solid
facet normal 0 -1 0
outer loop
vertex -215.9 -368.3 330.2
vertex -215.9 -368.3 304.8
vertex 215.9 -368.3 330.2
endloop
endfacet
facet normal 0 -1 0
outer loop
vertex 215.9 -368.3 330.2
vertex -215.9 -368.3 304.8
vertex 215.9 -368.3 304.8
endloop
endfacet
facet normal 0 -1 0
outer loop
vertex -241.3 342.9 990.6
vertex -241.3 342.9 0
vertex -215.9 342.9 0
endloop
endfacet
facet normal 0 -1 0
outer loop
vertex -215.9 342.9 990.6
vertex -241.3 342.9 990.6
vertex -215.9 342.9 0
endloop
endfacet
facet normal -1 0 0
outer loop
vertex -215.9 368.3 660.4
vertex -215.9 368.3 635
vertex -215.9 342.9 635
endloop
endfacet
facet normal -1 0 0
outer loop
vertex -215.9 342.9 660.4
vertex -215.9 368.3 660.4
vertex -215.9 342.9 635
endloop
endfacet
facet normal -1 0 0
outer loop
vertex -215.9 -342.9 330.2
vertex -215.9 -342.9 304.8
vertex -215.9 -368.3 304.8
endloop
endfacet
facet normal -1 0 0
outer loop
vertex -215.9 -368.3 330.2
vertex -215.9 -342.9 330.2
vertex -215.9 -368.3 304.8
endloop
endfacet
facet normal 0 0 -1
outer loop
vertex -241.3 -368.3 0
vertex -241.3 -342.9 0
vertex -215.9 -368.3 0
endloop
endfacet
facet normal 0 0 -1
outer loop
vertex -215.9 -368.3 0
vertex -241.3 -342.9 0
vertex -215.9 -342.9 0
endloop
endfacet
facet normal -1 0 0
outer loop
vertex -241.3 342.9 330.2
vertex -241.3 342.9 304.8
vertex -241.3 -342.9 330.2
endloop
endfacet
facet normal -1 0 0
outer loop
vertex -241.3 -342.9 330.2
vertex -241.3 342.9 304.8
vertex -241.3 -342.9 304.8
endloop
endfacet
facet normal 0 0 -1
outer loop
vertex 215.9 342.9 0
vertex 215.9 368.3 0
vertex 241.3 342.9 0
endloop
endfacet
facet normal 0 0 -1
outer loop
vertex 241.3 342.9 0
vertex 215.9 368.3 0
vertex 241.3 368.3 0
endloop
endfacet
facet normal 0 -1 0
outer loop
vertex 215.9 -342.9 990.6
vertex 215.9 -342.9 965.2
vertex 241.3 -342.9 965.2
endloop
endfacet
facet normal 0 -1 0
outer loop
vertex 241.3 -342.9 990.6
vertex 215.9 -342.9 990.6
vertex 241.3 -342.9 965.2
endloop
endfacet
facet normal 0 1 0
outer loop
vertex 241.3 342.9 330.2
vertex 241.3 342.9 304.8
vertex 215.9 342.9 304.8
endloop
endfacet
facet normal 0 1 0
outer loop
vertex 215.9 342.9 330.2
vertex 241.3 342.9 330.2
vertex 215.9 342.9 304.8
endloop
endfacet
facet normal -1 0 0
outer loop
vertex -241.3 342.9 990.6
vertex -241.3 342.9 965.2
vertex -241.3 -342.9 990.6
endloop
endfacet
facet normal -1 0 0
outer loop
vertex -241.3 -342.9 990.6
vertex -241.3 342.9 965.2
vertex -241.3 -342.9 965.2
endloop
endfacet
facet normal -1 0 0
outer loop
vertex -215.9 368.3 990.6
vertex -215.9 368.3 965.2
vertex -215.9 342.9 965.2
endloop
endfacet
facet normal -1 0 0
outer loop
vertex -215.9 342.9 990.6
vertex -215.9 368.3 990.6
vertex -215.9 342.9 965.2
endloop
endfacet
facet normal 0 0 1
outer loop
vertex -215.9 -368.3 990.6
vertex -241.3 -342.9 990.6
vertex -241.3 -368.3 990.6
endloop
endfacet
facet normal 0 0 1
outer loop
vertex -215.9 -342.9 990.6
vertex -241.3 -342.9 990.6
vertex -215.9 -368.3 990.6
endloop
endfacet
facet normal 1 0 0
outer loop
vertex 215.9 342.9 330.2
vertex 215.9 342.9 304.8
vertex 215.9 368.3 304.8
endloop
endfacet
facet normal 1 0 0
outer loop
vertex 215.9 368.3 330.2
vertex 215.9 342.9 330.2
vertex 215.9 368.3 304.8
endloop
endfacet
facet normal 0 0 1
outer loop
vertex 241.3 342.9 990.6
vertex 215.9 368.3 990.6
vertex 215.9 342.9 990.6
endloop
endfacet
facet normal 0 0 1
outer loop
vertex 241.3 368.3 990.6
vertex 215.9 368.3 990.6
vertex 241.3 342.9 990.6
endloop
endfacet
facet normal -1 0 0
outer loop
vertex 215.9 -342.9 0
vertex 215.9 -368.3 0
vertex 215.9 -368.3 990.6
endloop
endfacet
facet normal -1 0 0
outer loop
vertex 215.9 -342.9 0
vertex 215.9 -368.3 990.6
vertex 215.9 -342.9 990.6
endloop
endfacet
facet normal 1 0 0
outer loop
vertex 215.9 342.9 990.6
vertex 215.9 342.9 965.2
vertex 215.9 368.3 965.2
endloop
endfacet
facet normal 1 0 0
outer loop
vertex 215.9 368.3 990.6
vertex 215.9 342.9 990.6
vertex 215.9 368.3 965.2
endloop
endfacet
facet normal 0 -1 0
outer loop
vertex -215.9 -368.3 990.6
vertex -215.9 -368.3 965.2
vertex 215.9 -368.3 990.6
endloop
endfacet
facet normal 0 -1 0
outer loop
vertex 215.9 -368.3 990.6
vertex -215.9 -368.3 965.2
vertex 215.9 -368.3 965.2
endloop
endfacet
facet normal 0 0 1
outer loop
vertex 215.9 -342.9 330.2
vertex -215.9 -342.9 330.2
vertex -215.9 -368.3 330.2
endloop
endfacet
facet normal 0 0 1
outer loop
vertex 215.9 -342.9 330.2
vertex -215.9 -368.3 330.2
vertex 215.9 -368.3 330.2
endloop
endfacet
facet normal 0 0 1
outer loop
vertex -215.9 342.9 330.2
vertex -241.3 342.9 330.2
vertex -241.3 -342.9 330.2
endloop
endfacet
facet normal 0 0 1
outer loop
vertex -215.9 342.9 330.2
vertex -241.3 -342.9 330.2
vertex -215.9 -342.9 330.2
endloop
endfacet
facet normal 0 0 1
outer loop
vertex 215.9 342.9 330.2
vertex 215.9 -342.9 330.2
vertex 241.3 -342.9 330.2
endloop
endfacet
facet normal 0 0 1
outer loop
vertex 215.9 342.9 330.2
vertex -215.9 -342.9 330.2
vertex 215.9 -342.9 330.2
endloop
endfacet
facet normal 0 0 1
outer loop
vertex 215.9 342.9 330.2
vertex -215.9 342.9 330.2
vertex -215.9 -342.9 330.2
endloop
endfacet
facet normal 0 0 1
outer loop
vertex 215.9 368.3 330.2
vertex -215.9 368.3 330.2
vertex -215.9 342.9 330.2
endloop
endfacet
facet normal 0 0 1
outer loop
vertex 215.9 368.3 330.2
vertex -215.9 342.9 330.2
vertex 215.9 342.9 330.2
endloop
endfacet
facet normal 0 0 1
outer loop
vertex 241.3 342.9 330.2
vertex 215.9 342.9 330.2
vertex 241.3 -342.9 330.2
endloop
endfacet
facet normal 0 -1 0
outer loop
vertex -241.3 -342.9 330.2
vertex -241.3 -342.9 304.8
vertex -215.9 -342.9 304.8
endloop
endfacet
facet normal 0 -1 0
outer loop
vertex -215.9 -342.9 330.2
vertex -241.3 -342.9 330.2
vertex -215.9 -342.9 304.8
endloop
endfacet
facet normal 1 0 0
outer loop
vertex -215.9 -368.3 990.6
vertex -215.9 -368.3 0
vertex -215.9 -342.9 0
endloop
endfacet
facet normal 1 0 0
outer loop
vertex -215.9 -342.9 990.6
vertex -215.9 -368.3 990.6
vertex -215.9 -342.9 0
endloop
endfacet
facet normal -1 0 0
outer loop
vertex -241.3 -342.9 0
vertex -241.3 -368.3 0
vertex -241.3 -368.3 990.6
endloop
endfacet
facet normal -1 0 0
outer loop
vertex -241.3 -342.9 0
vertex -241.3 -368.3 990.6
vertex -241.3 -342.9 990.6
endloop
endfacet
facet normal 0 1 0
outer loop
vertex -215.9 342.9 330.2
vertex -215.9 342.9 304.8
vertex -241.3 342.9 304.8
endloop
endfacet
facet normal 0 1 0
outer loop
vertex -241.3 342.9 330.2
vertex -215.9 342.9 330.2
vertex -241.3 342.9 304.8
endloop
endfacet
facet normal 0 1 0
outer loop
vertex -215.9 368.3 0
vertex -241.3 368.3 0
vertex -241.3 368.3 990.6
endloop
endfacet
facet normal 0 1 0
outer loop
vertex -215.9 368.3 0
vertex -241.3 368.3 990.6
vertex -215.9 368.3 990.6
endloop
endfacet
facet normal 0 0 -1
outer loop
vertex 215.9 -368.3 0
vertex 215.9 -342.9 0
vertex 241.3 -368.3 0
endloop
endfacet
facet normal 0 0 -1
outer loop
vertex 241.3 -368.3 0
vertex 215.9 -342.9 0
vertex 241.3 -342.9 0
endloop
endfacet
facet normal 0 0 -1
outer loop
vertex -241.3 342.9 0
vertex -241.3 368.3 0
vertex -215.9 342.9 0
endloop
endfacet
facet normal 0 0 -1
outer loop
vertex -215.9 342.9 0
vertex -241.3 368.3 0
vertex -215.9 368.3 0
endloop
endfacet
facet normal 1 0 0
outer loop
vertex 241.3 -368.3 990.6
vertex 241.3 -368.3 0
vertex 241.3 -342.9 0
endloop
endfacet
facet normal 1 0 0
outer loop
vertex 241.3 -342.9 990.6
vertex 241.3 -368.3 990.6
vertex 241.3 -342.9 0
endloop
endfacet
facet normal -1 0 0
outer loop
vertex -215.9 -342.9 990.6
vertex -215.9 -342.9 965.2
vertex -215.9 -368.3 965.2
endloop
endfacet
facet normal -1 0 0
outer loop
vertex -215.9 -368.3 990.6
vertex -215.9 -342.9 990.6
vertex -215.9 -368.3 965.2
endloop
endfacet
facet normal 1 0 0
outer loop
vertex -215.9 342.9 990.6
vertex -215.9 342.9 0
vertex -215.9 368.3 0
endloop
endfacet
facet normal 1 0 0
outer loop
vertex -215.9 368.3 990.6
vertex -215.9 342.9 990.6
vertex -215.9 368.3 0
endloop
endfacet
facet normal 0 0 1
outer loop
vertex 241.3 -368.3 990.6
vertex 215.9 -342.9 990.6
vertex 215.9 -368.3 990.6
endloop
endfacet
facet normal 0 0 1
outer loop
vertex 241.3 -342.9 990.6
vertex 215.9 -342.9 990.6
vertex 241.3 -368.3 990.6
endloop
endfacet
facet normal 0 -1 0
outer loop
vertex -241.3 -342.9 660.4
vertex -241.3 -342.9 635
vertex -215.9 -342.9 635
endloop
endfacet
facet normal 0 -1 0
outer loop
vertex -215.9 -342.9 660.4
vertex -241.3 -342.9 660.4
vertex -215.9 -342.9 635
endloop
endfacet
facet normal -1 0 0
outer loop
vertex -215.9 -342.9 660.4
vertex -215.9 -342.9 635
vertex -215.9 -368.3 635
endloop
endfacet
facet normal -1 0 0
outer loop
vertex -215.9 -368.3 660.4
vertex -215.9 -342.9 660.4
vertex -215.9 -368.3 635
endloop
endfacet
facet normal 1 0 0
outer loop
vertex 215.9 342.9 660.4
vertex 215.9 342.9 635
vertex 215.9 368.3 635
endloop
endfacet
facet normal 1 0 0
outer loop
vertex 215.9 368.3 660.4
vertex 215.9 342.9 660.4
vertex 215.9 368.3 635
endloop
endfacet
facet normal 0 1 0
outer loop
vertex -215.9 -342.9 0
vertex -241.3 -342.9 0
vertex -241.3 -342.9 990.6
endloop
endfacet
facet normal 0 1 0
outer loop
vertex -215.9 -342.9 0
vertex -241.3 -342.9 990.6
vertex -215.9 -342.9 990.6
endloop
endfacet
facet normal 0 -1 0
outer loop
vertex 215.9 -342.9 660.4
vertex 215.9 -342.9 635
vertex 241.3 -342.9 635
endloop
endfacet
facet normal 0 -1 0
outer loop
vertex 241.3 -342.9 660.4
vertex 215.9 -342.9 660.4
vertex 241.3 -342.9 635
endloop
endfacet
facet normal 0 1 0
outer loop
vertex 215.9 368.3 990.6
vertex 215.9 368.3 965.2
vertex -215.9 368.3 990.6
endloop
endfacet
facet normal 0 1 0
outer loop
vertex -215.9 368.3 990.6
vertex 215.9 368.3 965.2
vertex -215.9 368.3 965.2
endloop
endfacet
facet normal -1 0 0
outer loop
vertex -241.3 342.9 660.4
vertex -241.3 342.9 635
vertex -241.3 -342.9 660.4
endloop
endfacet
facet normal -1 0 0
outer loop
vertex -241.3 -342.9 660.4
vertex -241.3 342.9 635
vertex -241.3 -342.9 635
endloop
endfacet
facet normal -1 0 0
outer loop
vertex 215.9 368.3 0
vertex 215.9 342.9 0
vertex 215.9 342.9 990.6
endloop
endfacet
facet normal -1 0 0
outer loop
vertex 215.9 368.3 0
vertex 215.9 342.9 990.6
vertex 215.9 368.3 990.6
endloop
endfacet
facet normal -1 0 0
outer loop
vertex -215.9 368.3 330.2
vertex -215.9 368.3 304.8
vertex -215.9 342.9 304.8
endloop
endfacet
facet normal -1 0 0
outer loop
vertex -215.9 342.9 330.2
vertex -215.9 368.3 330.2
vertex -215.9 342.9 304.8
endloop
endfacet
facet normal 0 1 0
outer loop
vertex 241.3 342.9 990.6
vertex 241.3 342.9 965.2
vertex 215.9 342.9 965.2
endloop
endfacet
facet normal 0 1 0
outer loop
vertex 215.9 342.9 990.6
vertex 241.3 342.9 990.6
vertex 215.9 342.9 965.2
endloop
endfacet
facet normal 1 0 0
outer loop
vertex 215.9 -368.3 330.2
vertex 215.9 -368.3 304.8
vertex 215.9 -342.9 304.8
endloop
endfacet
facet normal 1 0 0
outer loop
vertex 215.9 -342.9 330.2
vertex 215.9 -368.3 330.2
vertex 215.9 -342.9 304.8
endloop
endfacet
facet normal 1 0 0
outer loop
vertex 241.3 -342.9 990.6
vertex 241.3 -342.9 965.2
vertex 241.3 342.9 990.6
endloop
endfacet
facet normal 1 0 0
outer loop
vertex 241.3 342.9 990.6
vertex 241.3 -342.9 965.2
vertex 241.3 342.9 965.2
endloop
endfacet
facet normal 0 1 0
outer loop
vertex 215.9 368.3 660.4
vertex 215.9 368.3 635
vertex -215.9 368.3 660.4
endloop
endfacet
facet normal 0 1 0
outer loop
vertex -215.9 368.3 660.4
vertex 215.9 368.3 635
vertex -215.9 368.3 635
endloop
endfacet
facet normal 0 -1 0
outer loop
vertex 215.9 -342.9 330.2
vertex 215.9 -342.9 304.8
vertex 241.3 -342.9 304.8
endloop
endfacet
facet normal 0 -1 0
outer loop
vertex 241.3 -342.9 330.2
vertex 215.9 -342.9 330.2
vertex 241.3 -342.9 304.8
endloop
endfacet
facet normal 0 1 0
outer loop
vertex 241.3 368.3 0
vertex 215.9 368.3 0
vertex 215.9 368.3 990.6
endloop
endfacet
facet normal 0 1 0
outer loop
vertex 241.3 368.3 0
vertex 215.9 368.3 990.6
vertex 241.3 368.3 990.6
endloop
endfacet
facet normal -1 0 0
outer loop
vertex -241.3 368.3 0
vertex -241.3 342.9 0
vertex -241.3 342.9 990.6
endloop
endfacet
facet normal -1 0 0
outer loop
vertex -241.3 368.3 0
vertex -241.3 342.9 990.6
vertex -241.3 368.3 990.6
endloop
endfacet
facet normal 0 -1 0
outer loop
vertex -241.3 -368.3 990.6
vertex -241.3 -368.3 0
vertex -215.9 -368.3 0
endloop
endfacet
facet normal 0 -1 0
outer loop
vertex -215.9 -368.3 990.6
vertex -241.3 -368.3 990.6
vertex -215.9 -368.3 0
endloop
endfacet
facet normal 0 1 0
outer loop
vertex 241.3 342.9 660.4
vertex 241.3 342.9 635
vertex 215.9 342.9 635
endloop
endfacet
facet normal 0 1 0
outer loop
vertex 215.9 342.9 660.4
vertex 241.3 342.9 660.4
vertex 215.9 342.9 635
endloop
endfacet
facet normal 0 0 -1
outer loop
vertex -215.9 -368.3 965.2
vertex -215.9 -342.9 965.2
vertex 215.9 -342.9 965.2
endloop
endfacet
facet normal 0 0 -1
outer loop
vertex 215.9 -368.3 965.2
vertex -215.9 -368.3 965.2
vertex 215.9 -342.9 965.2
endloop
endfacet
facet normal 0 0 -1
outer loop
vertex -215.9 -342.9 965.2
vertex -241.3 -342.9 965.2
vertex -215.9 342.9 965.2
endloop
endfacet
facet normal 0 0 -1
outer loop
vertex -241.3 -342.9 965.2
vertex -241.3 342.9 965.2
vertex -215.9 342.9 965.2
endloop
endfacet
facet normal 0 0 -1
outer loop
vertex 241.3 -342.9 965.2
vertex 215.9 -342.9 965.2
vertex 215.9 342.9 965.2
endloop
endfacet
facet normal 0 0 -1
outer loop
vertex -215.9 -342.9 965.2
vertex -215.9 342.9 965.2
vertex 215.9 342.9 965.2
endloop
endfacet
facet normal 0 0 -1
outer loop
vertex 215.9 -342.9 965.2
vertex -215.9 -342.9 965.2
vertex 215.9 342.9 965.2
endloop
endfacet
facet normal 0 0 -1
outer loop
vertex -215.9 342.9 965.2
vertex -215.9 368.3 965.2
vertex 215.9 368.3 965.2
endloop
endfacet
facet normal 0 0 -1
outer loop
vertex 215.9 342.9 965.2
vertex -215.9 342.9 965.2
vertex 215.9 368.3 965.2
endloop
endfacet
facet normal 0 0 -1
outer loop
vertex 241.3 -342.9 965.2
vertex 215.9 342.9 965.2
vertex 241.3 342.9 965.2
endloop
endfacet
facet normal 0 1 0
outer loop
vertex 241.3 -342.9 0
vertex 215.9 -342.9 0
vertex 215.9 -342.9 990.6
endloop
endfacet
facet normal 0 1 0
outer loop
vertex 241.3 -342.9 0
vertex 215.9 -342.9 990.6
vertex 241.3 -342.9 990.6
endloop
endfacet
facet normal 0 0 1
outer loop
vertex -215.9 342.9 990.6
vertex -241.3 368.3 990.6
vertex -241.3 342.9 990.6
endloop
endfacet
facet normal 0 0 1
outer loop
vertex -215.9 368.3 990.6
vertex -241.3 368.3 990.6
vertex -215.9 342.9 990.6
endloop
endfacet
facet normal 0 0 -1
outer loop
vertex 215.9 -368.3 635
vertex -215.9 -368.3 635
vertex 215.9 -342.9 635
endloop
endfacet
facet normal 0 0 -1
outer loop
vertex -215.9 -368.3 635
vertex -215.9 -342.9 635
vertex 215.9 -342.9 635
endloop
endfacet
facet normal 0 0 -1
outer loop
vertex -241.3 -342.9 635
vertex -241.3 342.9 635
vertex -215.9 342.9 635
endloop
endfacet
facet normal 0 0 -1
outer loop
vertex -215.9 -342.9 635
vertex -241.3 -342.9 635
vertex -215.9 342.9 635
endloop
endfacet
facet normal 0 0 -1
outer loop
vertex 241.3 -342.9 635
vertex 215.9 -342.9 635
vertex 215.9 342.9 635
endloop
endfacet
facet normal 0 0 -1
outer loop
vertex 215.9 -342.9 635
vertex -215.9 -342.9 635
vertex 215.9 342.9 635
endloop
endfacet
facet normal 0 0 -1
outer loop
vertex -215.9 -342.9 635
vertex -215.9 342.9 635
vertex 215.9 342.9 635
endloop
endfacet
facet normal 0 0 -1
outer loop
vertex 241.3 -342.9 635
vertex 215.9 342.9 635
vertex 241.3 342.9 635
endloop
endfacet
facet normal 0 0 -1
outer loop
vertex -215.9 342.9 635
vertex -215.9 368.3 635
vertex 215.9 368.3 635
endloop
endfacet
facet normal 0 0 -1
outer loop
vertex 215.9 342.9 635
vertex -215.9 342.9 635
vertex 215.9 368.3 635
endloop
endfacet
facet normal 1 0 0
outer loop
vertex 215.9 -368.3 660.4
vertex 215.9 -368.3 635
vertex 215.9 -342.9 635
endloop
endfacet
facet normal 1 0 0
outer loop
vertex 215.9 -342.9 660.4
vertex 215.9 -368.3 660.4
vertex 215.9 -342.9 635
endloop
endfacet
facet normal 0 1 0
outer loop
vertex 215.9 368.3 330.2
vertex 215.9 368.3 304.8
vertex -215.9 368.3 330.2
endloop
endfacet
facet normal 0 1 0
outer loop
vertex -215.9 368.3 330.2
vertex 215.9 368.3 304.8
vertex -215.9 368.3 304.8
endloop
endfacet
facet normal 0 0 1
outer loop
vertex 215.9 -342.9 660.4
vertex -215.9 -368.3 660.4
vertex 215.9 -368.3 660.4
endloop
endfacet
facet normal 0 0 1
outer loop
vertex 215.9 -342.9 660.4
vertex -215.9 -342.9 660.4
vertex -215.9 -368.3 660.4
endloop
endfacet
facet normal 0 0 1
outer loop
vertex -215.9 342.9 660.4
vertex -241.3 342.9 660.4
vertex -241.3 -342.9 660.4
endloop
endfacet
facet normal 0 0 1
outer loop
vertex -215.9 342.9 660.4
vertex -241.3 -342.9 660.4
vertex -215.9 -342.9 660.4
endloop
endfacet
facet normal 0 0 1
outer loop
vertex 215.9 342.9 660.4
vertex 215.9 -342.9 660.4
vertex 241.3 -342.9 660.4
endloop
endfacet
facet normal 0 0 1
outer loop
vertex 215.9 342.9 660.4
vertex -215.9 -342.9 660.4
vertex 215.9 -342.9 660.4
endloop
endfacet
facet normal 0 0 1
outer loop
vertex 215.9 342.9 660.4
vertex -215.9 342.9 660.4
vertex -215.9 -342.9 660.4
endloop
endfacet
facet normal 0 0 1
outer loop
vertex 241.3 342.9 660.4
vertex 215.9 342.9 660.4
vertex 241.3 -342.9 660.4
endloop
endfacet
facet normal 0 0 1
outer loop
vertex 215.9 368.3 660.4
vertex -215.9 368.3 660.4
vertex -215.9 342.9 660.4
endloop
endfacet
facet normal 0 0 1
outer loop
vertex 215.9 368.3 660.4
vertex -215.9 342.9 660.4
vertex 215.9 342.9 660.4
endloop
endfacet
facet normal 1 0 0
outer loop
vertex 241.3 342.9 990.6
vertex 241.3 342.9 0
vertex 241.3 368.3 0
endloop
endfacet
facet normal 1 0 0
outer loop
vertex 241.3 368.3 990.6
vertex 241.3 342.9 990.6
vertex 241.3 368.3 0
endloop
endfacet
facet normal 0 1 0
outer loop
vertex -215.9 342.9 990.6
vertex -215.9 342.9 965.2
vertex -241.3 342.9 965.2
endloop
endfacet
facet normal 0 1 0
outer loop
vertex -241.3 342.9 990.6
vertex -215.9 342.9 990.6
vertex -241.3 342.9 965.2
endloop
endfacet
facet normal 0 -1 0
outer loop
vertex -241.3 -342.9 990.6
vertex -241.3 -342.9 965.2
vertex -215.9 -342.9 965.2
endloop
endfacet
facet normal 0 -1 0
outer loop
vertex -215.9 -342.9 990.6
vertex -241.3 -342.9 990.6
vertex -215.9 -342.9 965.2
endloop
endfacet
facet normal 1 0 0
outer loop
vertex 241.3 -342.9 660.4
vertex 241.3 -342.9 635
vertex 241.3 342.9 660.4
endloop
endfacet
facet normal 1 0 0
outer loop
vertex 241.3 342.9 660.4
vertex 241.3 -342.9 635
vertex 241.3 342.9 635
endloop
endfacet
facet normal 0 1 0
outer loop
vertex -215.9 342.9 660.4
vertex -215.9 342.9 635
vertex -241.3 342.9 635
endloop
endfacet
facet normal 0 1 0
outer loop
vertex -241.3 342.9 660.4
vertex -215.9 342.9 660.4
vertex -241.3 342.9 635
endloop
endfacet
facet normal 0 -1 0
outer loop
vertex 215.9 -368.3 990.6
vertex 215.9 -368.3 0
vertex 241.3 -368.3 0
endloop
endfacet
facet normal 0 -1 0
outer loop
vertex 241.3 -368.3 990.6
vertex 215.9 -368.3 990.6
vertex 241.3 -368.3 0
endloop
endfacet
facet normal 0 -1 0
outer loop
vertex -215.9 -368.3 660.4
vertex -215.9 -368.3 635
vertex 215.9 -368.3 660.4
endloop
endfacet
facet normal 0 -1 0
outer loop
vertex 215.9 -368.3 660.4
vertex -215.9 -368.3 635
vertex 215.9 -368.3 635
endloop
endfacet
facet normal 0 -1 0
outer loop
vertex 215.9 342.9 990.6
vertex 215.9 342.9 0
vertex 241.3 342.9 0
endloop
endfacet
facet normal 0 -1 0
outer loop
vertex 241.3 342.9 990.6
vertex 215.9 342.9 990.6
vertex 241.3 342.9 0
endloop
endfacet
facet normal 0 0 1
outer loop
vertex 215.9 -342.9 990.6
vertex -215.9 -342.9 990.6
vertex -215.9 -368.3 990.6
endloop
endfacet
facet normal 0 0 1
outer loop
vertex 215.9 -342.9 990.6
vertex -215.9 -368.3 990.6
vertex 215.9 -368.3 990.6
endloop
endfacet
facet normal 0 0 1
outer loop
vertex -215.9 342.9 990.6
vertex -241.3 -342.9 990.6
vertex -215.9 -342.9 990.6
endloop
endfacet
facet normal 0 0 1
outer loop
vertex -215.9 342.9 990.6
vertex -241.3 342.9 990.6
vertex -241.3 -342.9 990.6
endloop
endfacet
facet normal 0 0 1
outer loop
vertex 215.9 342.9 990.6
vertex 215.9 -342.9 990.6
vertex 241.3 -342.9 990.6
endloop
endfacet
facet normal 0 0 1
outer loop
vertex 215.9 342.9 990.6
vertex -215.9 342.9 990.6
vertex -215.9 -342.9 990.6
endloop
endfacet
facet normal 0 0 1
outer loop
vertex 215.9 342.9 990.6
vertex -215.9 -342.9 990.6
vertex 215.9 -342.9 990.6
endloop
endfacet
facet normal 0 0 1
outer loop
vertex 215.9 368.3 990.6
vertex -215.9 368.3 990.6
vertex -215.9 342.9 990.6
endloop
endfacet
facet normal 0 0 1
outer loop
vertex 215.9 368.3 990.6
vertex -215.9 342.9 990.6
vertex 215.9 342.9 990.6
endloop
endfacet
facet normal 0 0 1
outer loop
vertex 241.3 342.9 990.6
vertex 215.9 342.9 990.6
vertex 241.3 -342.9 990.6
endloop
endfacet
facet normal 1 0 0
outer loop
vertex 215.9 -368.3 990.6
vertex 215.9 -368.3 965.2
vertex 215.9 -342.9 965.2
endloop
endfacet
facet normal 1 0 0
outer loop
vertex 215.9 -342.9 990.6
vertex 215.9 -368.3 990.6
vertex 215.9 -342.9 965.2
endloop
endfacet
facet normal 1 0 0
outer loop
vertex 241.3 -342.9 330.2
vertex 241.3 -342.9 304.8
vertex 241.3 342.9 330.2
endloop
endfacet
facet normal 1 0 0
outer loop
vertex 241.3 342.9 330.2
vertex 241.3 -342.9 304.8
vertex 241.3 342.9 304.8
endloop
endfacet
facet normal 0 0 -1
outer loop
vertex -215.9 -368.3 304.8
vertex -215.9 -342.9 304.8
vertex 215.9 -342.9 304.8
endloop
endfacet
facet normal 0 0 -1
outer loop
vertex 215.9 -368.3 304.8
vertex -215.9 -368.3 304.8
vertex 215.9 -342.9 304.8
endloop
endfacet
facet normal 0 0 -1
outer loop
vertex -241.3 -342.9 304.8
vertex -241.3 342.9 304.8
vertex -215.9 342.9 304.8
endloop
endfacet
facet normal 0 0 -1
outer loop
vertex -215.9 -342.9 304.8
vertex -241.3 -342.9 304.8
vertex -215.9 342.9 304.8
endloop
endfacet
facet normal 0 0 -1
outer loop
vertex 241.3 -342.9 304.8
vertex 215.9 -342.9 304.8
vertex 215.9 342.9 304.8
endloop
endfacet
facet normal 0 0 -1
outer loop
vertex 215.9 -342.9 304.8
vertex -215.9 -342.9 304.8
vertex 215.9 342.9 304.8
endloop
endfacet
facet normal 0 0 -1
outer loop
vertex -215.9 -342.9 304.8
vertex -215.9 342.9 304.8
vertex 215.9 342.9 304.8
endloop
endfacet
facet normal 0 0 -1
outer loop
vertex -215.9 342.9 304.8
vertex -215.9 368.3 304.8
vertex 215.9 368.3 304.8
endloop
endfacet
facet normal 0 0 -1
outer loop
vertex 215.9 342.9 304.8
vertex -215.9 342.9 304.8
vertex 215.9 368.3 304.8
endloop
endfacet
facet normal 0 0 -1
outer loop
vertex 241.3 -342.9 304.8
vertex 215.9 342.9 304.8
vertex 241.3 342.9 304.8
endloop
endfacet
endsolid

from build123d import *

# Parameters (mm, degrees)
F0_W      = 25.4
F0_H      = 25.4
F1_DEPTH  = 990.6
F4_DEPTH  = 25.4
F7_DEPTH  = 25.4
F10_DEPTH = 25.4


with BuildPart() as f1:
    # F0 (on Top) → F1 (new body)
    with BuildSketch(Plane.XY):
        with Locations((-228.6, 355.6)):
            Rectangle(F0_W, F0_H)
    extrude(amount=F1_DEPTH)


with BuildPart() as f1b:
    # F0 (on Top) → F1, piece 2 (new body)
    with BuildSketch(Plane.XY):
        with Locations((228.6, 355.6)):
            Rectangle(F0_W, F0_H)
    extrude(amount=F1_DEPTH)


with BuildPart() as f1c:
    # F0 (on Top) → F1, piece 3 (new body)
    with BuildSketch(Plane.XY):
        with Locations((-228.6, -355.6)):
            Rectangle(F0_W, F0_H)
    extrude(amount=F1_DEPTH)


with BuildPart() as f1d:
    # F0 (on Top) → F1, piece 4 (new body)
    with BuildSketch(Plane.XY):
        with Locations((228.6, -355.6)):
            Rectangle(F0_W, F0_H)
    extrude(amount=F1_DEPTH)


with BuildPart() as f4:
    # F3 (on offset) → F4 (new body)
    with BuildSketch(Plane.XY.offset(304.8)):
        Polygon((215.9, -342.9), (241.3, -342.9), (241.3, 342.9), (215.9, 342.9), (215.9, 368.3), (-215.9, 368.3), (-215.9, 342.9), (-241.3, 342.9), (-241.3, -342.9), (-215.9, -342.9), (-215.9, -368.3), (215.9, -368.3), align=None)
    extrude(amount=F4_DEPTH)


with BuildPart() as f7:
    # F6 (on offset) → F7 (new body)
    with BuildSketch(Plane.XY.offset(635)):
        Polygon((-215.9, -368.3), (215.9, -368.3), (215.9, -342.9), (241.3, -342.9), (241.3, 342.9), (215.9, 342.9), (215.9, 368.3), (-215.9, 368.3), (-215.9, 342.9), (-241.3, 342.9), (-241.3, -342.9), (-215.9, -342.9), align=None)
    extrude(amount=F7_DEPTH)


with BuildPart() as f10:
    # F9 (on offset) → F10 (new body)
    with BuildSketch(Plane.XY.offset(965.2)):
        Polygon((-241.3, -342.9), (-215.9, -342.9), (-215.9, -368.3), (215.9, -368.3), (215.9, -342.9), (241.3, -342.9), (241.3, 342.9), (215.9, 342.9), (215.9, 368.3), (-215.9, 368.3), (-215.9, 342.9), (-241.3, 342.9), align=None)
    extrude(amount=F10_DEPTH)


solid = Compound([f1.part, f1b.part, f1c.part, f1d.part, f4.part, f7.part, f10.part])
